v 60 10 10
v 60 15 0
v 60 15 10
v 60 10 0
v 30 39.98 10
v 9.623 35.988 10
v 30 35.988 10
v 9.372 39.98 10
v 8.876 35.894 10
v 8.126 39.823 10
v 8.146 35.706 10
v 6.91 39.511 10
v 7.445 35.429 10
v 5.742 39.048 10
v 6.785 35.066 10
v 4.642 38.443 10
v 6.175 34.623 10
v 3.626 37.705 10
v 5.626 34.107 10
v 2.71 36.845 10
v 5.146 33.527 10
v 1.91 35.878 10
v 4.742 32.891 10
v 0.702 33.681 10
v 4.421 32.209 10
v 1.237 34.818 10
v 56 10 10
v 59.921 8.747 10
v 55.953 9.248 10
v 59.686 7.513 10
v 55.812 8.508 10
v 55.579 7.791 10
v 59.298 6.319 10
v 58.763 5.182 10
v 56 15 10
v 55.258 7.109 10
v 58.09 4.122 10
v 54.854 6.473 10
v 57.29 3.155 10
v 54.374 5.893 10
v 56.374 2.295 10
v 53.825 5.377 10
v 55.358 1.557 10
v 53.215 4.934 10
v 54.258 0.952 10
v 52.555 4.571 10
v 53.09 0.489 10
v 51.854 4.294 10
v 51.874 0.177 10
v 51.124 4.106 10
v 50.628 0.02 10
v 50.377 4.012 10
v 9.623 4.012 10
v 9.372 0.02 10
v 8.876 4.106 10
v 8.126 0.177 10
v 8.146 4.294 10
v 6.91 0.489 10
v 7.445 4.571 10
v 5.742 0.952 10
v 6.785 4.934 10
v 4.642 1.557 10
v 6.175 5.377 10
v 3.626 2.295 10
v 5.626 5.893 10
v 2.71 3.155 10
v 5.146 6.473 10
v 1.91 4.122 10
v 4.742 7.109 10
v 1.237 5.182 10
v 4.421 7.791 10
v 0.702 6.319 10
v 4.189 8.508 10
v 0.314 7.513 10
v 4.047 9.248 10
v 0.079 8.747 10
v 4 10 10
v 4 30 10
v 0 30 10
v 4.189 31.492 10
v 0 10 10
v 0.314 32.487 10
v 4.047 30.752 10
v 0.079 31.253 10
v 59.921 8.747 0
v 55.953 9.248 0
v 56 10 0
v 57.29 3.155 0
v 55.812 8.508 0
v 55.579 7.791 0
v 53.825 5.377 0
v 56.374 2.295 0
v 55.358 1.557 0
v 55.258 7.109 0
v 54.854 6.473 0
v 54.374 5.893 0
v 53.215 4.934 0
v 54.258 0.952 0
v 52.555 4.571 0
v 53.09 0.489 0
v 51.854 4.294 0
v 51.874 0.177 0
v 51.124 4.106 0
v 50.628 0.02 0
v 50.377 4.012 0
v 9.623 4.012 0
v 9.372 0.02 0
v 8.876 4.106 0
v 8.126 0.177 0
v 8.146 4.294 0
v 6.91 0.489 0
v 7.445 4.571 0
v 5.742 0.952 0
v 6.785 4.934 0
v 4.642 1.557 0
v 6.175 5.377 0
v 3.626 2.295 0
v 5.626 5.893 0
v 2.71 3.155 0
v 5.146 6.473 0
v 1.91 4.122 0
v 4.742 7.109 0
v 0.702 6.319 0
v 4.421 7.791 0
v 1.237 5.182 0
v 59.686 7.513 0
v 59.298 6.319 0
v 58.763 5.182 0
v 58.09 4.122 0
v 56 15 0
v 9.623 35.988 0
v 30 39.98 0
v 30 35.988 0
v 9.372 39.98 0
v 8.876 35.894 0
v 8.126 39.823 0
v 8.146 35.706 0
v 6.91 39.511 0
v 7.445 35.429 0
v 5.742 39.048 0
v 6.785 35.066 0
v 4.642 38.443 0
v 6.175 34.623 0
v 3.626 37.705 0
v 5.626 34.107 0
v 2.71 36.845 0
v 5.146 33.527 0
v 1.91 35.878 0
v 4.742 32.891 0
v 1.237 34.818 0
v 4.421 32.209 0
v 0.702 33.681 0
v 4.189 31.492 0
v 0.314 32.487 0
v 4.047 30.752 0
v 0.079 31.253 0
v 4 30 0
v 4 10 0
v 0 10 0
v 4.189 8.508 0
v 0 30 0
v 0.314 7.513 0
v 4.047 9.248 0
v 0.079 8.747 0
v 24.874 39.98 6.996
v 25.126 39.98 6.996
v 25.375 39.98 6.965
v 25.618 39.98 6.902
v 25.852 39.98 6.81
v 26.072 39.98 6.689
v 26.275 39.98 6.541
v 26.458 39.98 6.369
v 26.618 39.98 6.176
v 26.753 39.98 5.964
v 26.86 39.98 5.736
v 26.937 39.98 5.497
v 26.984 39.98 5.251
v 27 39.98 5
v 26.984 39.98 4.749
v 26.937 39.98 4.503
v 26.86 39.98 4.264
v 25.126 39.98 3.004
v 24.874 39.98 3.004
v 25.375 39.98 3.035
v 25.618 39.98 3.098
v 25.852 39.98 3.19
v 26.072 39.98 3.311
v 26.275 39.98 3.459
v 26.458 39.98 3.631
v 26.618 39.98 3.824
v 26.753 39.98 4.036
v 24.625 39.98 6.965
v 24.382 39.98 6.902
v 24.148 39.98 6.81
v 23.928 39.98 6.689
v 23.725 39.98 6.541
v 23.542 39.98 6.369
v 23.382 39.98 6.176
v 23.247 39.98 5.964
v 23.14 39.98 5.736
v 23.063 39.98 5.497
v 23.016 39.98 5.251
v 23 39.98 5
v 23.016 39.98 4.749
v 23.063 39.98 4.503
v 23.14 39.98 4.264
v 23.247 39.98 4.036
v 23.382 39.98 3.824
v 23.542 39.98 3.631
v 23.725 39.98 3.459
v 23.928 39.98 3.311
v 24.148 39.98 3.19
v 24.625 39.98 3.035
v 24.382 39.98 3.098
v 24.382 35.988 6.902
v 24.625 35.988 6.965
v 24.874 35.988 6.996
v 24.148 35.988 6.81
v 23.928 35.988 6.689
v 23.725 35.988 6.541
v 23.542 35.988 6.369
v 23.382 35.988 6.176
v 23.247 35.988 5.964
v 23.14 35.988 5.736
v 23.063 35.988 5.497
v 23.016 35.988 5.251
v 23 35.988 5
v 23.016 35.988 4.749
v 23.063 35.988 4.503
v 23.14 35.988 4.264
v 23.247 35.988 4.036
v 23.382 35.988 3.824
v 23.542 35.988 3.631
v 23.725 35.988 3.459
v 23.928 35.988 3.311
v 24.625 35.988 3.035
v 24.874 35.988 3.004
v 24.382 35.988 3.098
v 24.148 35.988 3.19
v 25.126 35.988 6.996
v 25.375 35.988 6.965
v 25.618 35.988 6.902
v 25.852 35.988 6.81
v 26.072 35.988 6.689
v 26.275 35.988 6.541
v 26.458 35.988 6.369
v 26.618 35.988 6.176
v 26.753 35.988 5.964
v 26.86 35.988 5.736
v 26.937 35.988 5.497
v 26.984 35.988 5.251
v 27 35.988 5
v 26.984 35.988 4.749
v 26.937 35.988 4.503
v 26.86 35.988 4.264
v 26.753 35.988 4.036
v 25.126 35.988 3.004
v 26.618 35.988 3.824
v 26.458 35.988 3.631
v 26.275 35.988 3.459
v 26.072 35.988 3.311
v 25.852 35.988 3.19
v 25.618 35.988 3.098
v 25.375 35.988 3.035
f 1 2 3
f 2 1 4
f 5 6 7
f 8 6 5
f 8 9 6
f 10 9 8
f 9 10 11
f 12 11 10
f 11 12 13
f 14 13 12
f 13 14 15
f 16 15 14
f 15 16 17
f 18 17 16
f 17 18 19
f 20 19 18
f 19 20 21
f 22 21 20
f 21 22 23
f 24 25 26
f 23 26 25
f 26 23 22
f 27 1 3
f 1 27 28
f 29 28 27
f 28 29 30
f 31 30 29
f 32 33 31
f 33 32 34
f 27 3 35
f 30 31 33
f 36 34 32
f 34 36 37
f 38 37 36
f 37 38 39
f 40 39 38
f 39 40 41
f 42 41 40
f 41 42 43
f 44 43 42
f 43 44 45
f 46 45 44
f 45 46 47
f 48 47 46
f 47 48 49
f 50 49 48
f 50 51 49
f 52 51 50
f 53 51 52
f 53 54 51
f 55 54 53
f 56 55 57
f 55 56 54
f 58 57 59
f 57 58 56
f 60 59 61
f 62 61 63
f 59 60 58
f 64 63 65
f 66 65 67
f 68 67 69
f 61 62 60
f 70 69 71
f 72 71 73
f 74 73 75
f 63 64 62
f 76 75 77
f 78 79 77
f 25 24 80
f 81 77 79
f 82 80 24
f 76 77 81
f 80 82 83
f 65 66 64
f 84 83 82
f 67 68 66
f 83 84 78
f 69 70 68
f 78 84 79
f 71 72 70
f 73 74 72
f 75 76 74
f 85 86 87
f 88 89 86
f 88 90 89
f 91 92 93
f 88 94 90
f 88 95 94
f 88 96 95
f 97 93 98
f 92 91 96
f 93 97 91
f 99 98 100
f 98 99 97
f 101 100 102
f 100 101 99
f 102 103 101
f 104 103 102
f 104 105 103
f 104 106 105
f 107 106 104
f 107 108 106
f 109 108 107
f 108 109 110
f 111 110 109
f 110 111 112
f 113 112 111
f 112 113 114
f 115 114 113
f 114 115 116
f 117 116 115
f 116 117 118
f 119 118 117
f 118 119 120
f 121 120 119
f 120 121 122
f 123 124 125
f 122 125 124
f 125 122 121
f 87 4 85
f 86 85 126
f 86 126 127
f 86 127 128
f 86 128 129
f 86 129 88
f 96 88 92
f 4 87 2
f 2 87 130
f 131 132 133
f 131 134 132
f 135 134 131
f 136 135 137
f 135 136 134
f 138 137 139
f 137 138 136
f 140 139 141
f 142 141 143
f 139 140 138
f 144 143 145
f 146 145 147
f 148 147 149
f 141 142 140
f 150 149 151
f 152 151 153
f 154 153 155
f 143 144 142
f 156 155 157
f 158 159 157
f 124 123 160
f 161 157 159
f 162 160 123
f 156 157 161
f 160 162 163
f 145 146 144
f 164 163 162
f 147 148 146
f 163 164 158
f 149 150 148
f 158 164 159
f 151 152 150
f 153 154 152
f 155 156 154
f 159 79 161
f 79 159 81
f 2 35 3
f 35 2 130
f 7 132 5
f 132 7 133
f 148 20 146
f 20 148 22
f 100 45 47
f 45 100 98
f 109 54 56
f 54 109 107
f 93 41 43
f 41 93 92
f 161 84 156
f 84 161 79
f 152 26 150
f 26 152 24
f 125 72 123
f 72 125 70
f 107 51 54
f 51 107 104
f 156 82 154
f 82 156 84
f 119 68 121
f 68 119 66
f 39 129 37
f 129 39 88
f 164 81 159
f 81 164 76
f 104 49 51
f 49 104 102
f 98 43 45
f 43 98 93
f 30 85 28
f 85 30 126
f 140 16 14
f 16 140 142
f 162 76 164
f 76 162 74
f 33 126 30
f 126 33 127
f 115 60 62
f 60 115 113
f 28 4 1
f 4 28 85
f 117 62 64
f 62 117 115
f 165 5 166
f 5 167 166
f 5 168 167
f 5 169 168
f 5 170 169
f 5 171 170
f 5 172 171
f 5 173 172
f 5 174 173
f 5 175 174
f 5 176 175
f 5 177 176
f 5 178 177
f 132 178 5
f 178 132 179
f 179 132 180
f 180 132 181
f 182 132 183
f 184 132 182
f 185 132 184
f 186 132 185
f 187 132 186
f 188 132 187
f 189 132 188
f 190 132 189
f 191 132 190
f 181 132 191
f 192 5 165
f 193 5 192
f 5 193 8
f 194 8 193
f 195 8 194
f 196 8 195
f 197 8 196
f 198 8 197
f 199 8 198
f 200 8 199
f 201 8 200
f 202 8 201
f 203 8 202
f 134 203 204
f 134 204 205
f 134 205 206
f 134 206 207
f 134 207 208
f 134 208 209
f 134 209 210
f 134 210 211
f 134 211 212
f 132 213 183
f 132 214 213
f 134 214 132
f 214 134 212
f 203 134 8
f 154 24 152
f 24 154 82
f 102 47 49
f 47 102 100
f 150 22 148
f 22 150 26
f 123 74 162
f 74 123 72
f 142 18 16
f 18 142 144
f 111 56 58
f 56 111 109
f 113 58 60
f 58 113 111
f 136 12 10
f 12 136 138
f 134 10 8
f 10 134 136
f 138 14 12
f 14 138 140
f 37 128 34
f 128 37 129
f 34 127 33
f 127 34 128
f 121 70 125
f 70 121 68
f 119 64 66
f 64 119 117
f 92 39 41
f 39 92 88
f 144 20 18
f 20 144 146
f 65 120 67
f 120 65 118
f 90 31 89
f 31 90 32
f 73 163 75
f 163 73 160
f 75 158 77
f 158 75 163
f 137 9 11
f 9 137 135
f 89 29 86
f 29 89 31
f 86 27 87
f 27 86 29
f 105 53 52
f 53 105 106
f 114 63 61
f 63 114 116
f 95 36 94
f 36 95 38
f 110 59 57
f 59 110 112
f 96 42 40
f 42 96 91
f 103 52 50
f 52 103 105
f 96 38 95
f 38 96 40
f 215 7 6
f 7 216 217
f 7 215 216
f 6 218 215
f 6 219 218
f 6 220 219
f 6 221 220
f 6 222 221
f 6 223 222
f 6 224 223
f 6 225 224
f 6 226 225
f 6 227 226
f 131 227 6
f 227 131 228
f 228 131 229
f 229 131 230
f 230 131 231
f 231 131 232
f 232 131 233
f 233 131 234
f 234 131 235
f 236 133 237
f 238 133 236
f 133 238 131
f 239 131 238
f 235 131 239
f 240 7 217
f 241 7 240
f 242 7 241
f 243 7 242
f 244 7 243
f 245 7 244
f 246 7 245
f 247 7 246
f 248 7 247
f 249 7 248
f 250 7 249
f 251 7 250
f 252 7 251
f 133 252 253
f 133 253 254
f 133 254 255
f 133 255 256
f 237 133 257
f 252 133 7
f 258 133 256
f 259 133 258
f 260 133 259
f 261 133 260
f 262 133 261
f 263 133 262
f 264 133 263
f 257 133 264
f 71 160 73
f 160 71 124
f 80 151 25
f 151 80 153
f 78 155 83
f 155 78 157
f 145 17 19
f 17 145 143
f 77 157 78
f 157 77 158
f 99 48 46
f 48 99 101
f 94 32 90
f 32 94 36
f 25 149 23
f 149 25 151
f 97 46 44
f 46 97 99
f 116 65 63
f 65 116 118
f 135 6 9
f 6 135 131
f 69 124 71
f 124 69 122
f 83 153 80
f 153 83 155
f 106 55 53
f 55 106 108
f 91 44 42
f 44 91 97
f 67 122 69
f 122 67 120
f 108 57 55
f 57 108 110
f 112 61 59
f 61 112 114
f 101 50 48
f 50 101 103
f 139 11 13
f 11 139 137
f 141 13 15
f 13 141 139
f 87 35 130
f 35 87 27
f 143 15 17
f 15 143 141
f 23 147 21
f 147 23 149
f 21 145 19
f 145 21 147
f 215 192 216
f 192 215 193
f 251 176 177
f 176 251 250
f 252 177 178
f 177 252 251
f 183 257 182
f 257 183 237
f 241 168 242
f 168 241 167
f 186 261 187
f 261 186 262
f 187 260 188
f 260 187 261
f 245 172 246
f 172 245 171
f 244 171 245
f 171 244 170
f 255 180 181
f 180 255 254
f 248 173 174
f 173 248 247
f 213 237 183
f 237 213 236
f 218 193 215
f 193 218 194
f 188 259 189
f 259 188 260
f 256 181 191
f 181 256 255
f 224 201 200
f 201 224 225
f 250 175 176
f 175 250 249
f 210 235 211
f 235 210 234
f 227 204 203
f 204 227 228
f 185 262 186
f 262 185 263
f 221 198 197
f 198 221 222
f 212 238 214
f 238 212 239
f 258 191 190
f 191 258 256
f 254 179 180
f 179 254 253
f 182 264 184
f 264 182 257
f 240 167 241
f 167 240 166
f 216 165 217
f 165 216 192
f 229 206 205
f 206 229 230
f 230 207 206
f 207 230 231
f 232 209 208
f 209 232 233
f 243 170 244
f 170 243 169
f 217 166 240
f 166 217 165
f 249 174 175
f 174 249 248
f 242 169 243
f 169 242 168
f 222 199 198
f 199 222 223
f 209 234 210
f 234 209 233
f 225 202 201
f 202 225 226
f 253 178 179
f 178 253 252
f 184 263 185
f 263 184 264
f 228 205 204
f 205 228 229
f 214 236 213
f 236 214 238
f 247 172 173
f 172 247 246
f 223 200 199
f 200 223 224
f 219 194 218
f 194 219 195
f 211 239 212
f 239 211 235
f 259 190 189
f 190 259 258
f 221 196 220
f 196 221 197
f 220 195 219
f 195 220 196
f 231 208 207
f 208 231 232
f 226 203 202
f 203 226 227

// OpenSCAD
//
Heigth=40;
Width=60;
Depth=10;
Thickness=4;
Radius=10;
//
Mount_Width=30;
Tip_Heigth=15;
//
Hole_Diameter=4;
//
Overall_Quality=50;



difference(){
    intersection(){
        union(){
            cube([Width,Tip_Heigth,Depth],center=false);
            cube([Mount_Width,Heigth,Depth],center=false);
        }
           difference(){
                hull(){
                    translate([Radius,Radius,0])cylinder(r=Radius,h=Depth,$fn=Overall_Quality,center=false);
                    translate([Width-Radius,Radius,0])cylinder(r=Radius,h=Depth,$fn=Overall_Quality,center=false);
                    translate([Radius,Heigth-Radius,0])cylinder(r=Radius,h=Depth,$fn=Overall_Quality,center=false);
                    translate([Width-Radius,Heigth-Radius,0])cylinder(r=Radius,h=Depth,$fn=Overall_Quality,center=false);
        }
                hull(){
                    translate([Radius,Radius,0])cylinder(r=Radius-Thickness,h=Depth,$fn=Overall_Quality,center=false);
                    translate([Width-Radius,Radius,0])cylinder(r=Radius-Thickness,h=Depth,$fn=Overall_Quality,center=false);
                    translate([Radius,Heigth-Radius,0])cylinder(r=Radius-Thickness,h=Depth,$fn=Overall_Quality,center=false);
                    translate([Width-Radius,Heigth-Radius,0])cylinder(r=Radius-Thickness,h=Depth,$fn=Overall_Quality,center=false);
        }
    }
    }
    translate([Mount_Width-Depth/2,Heigth,Depth/2])rotate([90,0,0])cylinder(r=Hole_Diameter/2,h=4*Thickness,$fn=Overall_Quality,center=true);
}
